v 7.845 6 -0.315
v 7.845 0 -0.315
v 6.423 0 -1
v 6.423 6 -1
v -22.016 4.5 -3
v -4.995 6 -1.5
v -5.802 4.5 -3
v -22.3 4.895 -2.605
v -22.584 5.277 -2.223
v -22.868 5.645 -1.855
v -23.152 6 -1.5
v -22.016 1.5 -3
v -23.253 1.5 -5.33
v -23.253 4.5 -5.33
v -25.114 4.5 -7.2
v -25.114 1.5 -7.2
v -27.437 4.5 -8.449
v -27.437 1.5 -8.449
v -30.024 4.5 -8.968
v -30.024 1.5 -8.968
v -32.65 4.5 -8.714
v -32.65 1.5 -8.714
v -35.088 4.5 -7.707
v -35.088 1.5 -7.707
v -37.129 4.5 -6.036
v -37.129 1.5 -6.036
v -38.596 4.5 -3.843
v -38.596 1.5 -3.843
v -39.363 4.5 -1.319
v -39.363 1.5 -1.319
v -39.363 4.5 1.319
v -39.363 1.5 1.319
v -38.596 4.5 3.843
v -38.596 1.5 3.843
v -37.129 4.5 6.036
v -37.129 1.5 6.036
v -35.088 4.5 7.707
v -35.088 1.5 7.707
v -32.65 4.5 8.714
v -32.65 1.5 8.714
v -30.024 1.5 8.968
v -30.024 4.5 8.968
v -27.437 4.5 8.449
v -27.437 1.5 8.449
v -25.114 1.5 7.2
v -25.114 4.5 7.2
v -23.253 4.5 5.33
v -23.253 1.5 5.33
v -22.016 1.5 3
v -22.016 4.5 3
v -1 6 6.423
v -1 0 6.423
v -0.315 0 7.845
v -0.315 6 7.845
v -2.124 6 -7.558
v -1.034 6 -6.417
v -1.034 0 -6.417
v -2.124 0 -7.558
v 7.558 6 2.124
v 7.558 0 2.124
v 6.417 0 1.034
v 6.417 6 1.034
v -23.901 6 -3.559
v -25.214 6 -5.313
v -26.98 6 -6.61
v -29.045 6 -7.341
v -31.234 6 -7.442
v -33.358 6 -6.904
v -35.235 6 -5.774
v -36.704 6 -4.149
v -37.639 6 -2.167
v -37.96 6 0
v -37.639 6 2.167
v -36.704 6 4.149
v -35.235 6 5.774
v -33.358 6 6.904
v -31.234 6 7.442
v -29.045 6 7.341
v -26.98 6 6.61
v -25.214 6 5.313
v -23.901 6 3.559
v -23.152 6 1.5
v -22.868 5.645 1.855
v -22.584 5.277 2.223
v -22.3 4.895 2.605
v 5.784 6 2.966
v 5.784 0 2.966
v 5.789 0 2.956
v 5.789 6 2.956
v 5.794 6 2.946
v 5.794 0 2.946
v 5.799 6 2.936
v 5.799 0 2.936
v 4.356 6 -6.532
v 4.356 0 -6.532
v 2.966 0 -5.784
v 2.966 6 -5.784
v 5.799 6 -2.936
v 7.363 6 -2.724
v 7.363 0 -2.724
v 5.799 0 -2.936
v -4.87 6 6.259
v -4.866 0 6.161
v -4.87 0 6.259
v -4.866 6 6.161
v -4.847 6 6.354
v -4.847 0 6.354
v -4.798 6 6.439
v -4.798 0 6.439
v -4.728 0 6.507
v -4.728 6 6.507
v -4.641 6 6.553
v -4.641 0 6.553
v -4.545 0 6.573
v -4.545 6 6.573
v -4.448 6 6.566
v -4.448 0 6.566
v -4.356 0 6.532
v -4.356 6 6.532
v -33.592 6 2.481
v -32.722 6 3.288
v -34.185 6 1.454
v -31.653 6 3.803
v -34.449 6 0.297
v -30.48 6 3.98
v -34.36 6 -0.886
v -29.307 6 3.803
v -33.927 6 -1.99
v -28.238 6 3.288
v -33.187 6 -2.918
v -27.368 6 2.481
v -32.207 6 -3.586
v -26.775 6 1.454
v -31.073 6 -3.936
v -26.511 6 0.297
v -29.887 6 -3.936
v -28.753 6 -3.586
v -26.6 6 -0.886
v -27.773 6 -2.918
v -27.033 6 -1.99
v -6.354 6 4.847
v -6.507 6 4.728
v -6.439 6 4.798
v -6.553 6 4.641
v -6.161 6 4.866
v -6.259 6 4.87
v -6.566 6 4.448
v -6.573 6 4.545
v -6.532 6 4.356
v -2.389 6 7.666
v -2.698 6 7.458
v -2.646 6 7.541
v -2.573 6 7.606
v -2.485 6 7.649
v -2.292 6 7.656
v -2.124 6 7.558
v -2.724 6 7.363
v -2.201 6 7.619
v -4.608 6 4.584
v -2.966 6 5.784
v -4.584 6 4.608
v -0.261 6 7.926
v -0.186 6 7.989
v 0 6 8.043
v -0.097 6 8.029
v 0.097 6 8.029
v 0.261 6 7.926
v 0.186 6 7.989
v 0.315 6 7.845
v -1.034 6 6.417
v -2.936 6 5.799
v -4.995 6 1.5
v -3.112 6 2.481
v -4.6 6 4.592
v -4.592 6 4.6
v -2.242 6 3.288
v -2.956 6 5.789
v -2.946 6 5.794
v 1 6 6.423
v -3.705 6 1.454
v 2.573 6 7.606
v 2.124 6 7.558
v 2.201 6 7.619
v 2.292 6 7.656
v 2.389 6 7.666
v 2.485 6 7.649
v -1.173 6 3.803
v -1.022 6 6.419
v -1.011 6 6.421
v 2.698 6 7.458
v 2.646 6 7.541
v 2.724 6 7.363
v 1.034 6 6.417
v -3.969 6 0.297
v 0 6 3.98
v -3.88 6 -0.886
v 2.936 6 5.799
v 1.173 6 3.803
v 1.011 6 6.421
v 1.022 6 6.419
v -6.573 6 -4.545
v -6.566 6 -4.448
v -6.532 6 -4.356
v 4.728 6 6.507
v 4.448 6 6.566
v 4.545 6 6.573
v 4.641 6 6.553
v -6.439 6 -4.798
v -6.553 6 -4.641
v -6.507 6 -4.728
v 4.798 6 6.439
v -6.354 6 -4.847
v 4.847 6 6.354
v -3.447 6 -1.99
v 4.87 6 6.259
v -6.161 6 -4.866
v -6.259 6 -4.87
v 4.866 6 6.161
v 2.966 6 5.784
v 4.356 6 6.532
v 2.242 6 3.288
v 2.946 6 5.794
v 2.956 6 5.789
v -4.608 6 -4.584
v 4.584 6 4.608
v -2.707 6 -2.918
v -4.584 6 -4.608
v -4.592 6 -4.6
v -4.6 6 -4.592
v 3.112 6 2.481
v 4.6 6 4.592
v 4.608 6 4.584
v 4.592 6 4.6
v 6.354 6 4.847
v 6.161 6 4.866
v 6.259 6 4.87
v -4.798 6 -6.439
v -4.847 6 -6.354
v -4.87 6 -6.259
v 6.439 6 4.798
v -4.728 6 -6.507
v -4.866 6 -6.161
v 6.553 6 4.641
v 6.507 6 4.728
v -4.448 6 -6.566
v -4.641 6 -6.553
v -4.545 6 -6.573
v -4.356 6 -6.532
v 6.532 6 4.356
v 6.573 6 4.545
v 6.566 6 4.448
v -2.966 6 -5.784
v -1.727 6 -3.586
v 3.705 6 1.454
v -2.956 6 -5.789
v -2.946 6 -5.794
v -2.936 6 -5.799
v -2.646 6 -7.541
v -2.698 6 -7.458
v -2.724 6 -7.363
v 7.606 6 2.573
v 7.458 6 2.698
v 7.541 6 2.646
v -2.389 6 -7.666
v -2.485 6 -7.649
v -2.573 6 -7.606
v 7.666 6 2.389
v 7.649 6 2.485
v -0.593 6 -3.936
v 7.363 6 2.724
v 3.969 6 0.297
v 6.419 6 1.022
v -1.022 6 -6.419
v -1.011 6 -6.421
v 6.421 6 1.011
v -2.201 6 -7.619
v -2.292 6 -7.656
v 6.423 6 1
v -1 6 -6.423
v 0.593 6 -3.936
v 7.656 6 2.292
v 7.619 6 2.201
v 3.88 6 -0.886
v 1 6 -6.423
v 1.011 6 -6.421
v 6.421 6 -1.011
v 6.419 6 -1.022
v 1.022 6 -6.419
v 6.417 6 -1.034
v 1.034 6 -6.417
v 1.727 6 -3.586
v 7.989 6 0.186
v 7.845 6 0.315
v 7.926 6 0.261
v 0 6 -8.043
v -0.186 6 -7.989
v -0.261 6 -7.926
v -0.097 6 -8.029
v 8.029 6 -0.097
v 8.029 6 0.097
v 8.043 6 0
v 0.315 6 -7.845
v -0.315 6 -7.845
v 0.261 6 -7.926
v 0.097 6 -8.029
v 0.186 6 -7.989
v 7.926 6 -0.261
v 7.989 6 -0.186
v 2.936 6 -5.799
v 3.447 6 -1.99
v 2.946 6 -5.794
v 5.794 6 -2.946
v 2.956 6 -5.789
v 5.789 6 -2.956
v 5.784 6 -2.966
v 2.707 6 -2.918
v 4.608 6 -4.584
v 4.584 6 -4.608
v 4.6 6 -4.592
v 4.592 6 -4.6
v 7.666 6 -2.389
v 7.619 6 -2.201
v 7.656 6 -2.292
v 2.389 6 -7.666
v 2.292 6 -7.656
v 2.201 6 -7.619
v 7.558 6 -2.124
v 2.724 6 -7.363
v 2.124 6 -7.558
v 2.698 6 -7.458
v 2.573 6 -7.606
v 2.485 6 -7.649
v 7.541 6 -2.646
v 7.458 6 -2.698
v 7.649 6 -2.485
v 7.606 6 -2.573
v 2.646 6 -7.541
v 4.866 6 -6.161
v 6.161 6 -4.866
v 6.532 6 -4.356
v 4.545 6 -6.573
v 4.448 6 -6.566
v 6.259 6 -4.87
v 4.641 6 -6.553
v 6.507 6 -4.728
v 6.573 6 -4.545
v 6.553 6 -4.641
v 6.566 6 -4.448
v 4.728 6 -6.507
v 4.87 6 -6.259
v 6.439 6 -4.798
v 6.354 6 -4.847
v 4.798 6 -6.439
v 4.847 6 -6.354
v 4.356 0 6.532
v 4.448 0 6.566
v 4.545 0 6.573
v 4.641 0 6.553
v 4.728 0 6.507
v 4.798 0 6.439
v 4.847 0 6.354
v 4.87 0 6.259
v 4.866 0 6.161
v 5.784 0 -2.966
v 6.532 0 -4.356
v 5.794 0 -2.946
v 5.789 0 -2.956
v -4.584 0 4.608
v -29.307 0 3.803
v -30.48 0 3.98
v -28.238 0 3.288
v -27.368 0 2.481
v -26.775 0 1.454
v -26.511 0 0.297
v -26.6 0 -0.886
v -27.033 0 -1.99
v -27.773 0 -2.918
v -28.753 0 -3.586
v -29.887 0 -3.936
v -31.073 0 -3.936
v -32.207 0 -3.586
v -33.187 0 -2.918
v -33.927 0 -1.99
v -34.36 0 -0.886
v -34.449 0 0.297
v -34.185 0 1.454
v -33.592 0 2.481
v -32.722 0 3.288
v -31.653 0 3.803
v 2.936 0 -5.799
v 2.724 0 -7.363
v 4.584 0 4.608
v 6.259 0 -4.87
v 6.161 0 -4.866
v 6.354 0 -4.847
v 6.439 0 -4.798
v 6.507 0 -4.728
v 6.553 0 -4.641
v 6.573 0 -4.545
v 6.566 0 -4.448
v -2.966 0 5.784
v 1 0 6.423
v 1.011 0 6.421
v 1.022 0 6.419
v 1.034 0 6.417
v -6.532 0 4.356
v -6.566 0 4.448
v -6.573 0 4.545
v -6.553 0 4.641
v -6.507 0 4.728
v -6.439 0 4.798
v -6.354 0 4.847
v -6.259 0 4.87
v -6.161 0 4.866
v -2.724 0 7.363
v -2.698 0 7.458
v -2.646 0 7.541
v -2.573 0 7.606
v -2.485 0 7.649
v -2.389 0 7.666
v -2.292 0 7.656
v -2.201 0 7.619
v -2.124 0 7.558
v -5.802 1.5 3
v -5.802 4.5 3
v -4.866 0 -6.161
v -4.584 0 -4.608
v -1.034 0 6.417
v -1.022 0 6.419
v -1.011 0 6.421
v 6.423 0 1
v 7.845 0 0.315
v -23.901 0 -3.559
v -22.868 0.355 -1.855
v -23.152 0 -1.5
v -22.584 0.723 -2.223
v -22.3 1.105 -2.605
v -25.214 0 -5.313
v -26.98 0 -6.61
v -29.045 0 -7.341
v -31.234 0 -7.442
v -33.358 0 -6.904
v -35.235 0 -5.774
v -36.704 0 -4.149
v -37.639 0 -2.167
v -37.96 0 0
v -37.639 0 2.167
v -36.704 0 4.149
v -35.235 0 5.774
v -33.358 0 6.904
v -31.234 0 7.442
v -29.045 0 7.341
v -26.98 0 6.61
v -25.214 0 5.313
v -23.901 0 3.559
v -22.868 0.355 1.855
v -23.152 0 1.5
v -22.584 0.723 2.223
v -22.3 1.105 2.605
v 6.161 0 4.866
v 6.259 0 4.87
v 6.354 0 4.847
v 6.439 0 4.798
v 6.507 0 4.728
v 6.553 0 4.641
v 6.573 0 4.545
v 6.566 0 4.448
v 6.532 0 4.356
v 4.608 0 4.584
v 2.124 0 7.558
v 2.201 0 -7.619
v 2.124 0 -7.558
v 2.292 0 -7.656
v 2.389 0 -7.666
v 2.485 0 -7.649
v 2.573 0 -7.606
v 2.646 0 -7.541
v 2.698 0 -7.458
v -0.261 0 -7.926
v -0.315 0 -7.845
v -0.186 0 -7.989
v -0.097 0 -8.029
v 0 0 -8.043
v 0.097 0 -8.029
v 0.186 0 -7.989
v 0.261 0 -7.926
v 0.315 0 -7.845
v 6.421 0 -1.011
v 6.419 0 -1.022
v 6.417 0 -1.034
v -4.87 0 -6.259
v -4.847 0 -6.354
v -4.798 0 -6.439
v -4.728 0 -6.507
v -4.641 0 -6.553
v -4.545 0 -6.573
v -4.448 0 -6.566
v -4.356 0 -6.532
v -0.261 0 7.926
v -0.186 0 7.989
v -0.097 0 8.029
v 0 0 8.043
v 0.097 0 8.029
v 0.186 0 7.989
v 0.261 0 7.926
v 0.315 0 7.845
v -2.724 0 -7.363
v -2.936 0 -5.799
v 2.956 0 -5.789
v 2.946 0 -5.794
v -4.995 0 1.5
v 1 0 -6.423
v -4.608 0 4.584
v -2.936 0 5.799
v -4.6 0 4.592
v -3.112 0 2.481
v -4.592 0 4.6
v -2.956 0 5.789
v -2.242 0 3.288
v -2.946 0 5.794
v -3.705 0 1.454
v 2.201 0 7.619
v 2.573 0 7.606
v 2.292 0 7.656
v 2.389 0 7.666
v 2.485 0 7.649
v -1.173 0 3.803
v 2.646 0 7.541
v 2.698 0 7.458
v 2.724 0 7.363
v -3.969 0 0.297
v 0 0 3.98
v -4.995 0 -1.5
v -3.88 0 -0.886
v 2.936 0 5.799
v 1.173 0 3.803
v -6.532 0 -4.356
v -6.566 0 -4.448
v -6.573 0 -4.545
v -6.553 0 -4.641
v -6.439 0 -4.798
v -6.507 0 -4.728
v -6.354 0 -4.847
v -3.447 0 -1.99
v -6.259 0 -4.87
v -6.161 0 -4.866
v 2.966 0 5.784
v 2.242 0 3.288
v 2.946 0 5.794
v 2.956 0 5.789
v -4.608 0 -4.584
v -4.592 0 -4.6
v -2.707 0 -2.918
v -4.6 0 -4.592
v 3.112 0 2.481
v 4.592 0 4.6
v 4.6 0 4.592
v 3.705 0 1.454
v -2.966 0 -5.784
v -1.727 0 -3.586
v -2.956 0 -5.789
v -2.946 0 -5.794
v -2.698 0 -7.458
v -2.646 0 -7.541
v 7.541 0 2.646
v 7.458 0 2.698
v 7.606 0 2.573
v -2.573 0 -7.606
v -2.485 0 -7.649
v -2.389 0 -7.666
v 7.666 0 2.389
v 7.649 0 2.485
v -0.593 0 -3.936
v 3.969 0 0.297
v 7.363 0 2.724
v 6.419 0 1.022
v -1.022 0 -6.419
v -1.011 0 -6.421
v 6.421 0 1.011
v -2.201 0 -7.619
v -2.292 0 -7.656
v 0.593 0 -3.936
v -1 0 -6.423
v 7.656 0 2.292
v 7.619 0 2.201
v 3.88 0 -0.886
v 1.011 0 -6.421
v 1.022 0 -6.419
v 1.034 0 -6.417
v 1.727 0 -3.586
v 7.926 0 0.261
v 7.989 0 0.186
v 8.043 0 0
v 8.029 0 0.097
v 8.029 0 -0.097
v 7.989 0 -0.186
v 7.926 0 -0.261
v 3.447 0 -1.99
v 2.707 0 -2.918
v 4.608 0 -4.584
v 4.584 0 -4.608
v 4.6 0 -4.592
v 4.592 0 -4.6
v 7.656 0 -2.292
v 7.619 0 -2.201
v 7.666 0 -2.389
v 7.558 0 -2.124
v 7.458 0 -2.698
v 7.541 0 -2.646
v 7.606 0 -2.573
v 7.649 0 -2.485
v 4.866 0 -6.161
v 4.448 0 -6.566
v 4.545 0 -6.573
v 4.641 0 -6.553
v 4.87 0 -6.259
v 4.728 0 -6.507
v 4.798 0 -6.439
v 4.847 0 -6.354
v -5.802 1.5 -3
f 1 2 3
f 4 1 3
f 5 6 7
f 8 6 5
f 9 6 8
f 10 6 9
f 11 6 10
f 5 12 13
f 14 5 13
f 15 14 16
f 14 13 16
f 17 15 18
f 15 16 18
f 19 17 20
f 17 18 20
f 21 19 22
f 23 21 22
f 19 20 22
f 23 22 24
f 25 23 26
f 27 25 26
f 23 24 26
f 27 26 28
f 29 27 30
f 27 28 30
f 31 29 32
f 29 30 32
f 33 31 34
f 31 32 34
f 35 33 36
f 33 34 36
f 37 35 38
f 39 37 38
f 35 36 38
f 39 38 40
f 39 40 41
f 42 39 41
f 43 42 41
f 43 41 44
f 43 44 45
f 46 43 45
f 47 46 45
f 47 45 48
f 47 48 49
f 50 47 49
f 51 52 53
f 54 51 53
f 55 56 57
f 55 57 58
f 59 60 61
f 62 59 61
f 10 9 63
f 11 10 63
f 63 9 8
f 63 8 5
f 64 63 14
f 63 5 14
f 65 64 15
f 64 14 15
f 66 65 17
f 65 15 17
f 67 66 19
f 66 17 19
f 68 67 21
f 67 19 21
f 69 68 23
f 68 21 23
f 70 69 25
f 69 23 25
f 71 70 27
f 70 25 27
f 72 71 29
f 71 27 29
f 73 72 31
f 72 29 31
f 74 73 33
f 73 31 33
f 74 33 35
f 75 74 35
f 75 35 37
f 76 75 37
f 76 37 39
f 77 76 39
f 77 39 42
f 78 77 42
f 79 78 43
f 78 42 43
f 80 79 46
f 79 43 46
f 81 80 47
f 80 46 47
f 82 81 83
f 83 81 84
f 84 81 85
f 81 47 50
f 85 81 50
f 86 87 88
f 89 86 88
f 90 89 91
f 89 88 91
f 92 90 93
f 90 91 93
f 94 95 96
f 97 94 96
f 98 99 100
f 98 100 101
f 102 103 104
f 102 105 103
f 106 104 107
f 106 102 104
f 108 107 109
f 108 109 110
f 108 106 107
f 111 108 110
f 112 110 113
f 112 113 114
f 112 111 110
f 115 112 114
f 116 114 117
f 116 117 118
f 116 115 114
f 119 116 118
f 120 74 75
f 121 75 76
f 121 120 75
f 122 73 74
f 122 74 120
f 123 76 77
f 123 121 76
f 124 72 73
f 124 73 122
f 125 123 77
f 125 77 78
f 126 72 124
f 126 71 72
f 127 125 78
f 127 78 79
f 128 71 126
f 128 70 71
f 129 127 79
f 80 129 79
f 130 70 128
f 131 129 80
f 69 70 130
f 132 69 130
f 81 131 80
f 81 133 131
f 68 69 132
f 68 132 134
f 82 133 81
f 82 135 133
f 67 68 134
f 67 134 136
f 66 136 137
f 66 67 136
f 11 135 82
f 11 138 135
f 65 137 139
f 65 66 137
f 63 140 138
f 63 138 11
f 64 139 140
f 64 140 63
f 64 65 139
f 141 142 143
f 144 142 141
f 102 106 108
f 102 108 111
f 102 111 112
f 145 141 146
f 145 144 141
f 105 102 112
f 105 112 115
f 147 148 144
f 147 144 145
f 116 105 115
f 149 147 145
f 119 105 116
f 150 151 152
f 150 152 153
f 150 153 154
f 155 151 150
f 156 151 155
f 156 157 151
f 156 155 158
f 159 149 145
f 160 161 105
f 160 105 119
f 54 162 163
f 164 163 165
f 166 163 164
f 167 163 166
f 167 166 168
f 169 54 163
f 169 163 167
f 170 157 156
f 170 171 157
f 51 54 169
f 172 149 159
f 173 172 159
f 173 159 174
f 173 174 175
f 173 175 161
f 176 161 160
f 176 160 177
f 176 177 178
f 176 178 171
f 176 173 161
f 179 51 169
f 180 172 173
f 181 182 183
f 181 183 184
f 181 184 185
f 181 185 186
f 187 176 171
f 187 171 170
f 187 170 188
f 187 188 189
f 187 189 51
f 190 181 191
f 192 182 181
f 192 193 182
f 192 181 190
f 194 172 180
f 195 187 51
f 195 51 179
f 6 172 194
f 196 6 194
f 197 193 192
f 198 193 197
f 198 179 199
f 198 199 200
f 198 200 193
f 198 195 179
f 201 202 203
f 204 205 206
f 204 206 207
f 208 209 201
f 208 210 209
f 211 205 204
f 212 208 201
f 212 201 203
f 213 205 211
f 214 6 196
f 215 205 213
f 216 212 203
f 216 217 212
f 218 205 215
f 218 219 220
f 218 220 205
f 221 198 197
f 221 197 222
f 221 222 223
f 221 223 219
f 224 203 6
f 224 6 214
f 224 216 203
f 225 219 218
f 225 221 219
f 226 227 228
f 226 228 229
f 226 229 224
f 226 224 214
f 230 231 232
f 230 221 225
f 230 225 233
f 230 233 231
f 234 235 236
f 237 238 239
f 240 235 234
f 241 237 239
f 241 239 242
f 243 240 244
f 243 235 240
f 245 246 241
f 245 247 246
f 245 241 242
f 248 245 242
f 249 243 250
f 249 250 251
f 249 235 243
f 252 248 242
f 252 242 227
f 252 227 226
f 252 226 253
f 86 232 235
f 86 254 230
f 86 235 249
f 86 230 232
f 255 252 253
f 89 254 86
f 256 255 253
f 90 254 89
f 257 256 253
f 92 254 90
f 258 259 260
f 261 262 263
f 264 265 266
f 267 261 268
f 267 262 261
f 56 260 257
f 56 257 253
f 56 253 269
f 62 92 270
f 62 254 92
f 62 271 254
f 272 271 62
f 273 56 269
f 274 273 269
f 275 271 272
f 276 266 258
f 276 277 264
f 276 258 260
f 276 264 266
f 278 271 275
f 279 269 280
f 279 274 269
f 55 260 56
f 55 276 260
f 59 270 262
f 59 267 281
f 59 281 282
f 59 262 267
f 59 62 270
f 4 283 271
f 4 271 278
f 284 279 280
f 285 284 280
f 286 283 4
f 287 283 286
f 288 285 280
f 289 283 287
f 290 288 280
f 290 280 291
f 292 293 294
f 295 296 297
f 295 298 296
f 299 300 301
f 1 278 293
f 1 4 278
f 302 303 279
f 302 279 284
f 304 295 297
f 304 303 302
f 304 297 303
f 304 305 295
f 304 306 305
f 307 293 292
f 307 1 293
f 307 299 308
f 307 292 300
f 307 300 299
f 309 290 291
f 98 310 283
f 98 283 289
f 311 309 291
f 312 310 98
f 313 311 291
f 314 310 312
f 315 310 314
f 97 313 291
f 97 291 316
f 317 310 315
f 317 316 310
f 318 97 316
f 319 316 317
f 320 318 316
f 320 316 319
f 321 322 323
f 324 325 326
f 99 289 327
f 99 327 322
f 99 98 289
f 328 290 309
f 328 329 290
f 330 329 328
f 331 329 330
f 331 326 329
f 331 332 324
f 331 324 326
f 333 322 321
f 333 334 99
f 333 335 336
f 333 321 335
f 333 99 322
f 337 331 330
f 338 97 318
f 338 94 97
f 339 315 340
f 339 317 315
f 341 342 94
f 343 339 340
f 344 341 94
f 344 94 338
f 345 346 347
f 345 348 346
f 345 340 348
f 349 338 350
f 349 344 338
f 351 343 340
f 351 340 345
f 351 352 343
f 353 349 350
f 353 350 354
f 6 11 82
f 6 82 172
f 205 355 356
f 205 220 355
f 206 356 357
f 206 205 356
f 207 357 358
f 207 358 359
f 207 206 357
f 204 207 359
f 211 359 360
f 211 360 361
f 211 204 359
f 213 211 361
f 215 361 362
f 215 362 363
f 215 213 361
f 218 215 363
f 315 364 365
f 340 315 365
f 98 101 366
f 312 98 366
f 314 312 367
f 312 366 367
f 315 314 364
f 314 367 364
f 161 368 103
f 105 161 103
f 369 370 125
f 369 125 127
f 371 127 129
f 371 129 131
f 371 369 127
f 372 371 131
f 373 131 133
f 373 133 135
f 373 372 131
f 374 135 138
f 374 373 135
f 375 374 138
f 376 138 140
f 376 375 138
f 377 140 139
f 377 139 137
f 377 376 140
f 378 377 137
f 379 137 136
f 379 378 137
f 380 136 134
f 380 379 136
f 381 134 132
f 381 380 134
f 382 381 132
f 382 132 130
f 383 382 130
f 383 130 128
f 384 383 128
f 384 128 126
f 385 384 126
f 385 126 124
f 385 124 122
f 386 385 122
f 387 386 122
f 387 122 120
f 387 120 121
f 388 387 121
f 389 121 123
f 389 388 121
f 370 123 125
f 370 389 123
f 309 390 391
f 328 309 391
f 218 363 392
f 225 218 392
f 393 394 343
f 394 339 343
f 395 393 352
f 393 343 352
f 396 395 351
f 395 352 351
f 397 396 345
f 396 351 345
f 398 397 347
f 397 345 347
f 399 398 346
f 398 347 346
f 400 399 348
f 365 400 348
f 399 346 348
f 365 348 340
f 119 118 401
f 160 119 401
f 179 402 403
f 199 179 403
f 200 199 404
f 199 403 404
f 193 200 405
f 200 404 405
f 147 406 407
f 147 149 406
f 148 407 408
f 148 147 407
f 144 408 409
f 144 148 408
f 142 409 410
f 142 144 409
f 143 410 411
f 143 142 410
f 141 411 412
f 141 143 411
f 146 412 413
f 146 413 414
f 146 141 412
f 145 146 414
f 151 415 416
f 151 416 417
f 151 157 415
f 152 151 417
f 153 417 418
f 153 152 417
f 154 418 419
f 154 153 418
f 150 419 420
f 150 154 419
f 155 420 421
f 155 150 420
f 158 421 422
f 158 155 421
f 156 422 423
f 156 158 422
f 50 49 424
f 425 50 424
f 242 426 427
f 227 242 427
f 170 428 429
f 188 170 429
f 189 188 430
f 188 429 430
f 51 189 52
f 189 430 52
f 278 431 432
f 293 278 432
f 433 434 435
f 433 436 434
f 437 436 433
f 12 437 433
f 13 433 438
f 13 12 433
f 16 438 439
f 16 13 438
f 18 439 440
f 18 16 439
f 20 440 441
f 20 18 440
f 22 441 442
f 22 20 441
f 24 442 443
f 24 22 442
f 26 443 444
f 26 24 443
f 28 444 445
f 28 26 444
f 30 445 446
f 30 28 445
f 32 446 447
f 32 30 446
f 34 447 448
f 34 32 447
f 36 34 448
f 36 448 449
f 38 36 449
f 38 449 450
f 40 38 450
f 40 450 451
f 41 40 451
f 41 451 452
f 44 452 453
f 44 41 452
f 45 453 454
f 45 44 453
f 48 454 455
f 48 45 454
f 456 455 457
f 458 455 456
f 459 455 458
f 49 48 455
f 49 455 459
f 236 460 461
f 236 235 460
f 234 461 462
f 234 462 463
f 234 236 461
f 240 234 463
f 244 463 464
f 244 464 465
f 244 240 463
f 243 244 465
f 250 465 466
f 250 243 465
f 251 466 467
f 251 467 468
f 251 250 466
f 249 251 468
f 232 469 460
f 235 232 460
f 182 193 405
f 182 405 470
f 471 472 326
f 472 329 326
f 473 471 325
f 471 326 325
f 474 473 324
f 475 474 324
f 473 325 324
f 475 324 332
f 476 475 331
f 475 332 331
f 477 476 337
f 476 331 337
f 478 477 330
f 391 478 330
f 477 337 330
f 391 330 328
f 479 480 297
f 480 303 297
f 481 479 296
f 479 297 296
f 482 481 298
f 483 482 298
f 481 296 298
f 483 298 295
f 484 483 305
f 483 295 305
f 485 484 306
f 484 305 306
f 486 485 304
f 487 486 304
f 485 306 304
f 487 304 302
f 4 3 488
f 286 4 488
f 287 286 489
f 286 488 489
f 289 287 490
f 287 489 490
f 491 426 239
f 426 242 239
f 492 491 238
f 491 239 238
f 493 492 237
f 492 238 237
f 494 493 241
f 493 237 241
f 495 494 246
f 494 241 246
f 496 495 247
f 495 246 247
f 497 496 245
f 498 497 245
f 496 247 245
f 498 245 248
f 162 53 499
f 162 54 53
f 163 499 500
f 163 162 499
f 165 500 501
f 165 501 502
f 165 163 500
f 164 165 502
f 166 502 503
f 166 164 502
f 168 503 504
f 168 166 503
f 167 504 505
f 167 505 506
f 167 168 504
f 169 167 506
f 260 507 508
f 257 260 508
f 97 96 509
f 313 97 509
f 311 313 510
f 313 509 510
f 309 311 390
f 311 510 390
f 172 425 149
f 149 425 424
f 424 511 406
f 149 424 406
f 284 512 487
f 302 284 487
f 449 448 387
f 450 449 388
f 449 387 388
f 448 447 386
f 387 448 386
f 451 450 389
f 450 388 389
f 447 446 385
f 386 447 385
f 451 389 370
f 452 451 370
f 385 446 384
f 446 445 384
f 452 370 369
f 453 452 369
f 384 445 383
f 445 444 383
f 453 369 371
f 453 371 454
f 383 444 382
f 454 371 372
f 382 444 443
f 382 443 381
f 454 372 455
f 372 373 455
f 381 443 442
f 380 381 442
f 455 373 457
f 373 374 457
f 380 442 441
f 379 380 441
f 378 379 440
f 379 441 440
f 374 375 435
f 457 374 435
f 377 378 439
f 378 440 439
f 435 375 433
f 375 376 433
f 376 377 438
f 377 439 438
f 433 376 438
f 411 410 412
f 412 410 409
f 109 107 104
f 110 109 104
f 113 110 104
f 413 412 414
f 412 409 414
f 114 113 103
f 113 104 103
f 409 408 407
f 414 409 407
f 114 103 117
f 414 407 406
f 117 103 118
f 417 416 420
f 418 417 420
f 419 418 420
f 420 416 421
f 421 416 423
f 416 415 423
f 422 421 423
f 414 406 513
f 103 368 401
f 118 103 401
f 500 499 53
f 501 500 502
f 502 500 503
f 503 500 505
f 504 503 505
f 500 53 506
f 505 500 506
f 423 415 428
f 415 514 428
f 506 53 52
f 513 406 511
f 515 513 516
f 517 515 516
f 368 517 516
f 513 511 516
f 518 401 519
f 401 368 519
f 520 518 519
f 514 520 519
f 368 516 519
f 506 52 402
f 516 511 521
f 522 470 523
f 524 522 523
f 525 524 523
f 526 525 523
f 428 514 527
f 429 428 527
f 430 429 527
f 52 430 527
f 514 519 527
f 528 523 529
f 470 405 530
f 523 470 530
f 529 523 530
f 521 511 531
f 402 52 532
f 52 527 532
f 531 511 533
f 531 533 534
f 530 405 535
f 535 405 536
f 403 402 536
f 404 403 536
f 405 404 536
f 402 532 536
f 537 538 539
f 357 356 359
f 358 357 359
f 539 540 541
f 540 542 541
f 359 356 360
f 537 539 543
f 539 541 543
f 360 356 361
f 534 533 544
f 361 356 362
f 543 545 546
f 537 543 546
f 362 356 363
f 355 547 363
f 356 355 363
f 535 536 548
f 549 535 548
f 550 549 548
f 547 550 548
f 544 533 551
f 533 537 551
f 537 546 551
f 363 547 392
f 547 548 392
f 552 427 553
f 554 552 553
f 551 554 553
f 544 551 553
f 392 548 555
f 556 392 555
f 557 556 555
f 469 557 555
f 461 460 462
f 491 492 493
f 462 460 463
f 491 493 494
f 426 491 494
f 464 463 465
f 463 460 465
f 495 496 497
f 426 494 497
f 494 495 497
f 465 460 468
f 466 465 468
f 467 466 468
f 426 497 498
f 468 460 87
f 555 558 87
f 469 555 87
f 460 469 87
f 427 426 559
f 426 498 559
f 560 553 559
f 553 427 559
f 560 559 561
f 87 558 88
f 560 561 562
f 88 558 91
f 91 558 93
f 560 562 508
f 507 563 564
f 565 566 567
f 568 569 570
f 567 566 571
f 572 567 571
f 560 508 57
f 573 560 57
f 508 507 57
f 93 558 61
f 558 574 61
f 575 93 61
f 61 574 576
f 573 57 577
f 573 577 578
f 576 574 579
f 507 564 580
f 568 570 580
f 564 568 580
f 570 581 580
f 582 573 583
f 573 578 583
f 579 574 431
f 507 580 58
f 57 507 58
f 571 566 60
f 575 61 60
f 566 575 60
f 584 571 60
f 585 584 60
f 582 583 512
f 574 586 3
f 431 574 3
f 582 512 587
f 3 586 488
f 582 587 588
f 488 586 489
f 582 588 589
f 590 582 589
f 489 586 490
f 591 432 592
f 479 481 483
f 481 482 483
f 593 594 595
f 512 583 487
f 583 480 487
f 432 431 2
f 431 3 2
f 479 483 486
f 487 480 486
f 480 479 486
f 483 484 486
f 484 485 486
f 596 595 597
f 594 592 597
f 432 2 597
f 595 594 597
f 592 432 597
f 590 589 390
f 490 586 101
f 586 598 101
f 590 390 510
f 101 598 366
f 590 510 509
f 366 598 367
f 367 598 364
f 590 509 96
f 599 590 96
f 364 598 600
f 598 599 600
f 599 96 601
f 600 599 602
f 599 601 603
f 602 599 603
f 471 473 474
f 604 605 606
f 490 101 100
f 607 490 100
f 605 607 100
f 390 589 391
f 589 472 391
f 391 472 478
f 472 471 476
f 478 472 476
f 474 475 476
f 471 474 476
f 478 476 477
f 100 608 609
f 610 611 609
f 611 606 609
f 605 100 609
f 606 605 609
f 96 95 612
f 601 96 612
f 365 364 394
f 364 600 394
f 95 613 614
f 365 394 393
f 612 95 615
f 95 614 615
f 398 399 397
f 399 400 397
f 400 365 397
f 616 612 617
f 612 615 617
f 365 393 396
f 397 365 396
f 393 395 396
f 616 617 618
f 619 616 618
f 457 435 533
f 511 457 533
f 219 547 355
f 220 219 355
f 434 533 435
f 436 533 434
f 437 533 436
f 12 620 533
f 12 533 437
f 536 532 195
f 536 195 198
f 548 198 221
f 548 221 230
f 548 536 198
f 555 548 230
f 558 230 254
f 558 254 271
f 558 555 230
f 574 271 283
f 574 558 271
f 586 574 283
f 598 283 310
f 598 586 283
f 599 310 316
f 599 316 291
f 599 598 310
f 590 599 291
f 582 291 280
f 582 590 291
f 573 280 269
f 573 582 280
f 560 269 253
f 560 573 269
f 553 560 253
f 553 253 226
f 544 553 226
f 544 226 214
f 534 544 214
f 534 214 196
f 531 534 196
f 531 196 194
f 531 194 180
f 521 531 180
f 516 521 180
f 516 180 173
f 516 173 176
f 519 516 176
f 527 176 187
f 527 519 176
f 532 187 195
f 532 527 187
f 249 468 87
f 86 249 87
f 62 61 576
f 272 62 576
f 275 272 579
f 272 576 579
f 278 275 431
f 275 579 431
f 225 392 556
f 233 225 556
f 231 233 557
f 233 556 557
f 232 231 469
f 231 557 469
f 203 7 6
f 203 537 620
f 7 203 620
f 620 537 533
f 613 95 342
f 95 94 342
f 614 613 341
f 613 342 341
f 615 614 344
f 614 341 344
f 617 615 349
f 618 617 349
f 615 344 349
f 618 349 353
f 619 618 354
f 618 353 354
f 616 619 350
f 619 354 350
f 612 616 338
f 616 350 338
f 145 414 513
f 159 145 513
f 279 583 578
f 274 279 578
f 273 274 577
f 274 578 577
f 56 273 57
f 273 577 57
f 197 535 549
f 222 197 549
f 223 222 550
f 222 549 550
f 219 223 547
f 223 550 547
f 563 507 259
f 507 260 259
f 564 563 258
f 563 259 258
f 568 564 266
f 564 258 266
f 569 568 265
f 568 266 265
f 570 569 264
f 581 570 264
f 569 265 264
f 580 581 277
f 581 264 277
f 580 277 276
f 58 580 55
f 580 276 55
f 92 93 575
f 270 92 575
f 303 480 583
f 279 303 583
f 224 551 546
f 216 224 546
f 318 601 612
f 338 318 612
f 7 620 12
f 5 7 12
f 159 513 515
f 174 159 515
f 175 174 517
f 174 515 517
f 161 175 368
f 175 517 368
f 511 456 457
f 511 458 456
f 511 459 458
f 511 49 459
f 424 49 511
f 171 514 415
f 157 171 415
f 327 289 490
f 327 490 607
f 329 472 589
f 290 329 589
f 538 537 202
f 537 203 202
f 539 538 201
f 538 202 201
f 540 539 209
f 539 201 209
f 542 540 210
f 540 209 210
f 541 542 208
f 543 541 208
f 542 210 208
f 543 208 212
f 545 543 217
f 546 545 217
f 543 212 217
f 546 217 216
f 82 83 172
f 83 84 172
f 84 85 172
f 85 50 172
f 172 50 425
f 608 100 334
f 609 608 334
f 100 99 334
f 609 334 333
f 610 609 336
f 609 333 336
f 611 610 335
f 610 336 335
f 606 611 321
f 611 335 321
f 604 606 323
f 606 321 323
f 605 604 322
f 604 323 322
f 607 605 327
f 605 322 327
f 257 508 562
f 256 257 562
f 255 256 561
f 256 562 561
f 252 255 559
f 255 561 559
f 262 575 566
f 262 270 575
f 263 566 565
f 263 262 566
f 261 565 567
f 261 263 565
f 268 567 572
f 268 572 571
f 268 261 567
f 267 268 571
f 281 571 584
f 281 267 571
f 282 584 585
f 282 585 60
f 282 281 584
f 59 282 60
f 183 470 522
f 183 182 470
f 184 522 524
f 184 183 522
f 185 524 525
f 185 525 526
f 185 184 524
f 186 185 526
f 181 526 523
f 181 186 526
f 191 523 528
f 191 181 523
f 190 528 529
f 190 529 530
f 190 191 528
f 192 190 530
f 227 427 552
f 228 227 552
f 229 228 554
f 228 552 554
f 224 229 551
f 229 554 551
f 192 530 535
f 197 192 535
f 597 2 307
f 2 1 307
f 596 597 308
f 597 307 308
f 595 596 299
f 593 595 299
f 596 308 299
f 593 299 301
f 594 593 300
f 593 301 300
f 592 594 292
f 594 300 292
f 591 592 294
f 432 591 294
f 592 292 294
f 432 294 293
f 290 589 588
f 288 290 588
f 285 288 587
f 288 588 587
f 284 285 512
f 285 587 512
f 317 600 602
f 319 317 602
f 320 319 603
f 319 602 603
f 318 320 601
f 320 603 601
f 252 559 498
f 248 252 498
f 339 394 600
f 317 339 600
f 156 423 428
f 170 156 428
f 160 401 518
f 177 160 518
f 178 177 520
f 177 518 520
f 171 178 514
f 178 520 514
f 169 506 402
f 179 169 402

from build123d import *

# Parameters (mm, degrees)
SKETCH1_R           = 3.98
BOSS_EXTRUDE1_DEPTH = 6
FILLET1_R           = 0.35
CHAMFER1_SIZE       = 1.5


with BuildPart() as part:
    # Sketch1 → Boss-Extrude1 (new body)
    with BuildSketch(Plane(origin=(0, 0, 0), x_dir=(1, 0, 0), z_dir=(0, 1, 0))):
        with BuildLine():
            Line((-14.732151132, 3), (-22.015934783, 3))
            ThreePointArc((-22.015934783, 3), (-39.46, 0), (-22.015934783, -3))
            Line((-22.015934783, -3), (-5.802039289, -3))
            Line((-5.802039289, -3), (-6.876644452, -4.996174644))
            Line((-6.876644452, -4.996174644), (-4.608220474, -4.58413613))
            ThreePointArc((-4.608220474, -4.58413613), (-4.596194078, -4.596194078), (-4.58413613, -4.608220474))
            Line((-4.58413613, -4.608220474), (-4.996174644, -6.876644452))
            Line((-4.996174644, -6.876644452), (-2.966102142, -5.783790979))
            ThreePointArc((-2.966102142, -5.783790979), (-2.950938248, -5.791542407), (-2.935754098, -5.799254079))
            Line((-2.935754098, -5.799254079), (-2.626644452, -8.083980389))
            Line((-2.626644452, -8.083980389), (-1.033641065, -6.417288068))
            ThreePointArc((-1.033641065, -6.417288068), (-1.016824023, -6.419974214), (-1, -6.422616289))
            Line((-1, -6.422616289), (0, -8.5))
            Line((0, -8.5), (1, -6.422616289))
            ThreePointArc((1, -6.422616289), (1.016824023, -6.419974214), (1.033641065, -6.417288068))
            Line((1.033641065, -6.417288068), (2.626644452, -8.083980389))
            Line((2.626644452, -8.083980389), (2.935754098, -5.799254079))
            ThreePointArc((2.935754098, -5.799254079), (2.950938248, -5.791542407), (2.966102142, -5.783790979))
            Line((2.966102142, -5.783790979), (4.996174644, -6.876644452))
            Line((4.996174644, -6.876644452), (4.58413613, -4.608220474))
            ThreePointArc((4.58413613, -4.608220474), (4.596194078, -4.596194078), (4.608220474, -4.58413613))
            Line((4.608220474, -4.58413613), (6.876644452, -4.996174644))
            Line((6.876644452, -4.996174644), (5.783790979, -2.966102142))
            ThreePointArc((5.783790979, -2.966102142), (5.791542407, -2.950938248), (5.799254079, -2.935754098))
            Line((5.799254079, -2.935754098), (8.083980389, -2.626644452))
            Line((8.083980389, -2.626644452), (6.417288068, -1.033641065))
            ThreePointArc((6.417288068, -1.033641065), (6.419974214, -1.016824023), (6.422616289, -1))
            Line((6.422616289, -1), (8.5, 0))
            Line((8.5, 0), (6.422616289, 1))
            ThreePointArc((6.422616289, 1), (6.419974214, 1.016824023), (6.417288068, 1.033641065))
            Line((6.417288068, 1.033641065), (8.083980389, 2.626644452))
            Line((8.083980389, 2.626644452), (5.799254079, 2.935754098))
            ThreePointArc((5.799254079, 2.935754098), (5.791542407, 2.950938248), (5.783790979, 2.966102142))
            Line((5.783790979, 2.966102142), (6.876644452, 4.996174644))
            Line((6.876644452, 4.996174644), (4.608220474, 4.58413613))
            ThreePointArc((4.608220474, 4.58413613), (4.596194078, 4.596194078), (4.58413613, 4.608220474))
            Line((4.58413613, 4.608220474), (4.996174644, 6.876644452))
            Line((4.996174644, 6.876644452), (2.966102142, 5.783790979))
            ThreePointArc((2.966102142, 5.783790979), (2.950938248, 5.791542407), (2.935754098, 5.799254079))
            Line((2.935754098, 5.799254079), (2.626644452, 8.083980389))
            Line((2.626644452, 8.083980389), (1.033641065, 6.417288068))
            ThreePointArc((1.033641065, 6.417288068), (1.016824023, 6.419974214), (1, 6.422616289))
            Line((1, 6.422616289), (0, 8.5))
            Line((0, 8.5), (-1, 6.422616289))
            ThreePointArc((-1, 6.422616289), (-1.016824023, 6.419974214), (-1.033641065, 6.417288068))
            Line((-1.033641065, 6.417288068), (-2.626644452, 8.083980389))
            Line((-2.626644452, 8.083980389), (-2.935754098, 5.799254079))
            ThreePointArc((-2.935754098, 5.799254079), (-2.950938248, 5.791542407), (-2.966102142, 5.783790979))
            Line((-2.966102142, 5.783790979), (-4.996174644, 6.876644452))
            Line((-4.996174644, 6.876644452), (-4.58413613, 4.608220474))
            ThreePointArc((-4.58413613, 4.608220474), (-4.596194078, 4.596194078), (-4.608220474, 4.58413613))
            Line((-4.608220474, 4.58413613), (-6.876644452, 4.996174644))
            Line((-6.876644452, 4.996174644), (-5.802039289, 3))
            Line((-5.802039289, 3), (-14.732151132, 3))
        make_face()
        with Locations(Location((-30.48, 0, 0), (0, 0, 270))):
            Circle(SKETCH1_R, mode=Mode.SUBTRACT)
        with Locations(Location((0, 0, 0), (0, 0, 270))):
            Circle(SKETCH1_R, mode=Mode.SUBTRACT)
    extrude(amount=BOSS_EXTRUDE1_DEPTH)

    # Fillet1
    fillet1_edges = [part.edges().sort_by_distance(p)[0] for p in [
        (0, 3, 8.5),
        (-2.626644452, 3, 8.083980389),
        (-4.996174644, 3, 6.876644452),
        (-6.876644452, 3, 4.996174644),
        (-6.876644452, 3, -4.996174644),
        (-4.996174644, 3, -6.876644452),
        (-2.626644452, 3, -8.083980389),
        (0, 3, -8.5),
        (2.626644452, 3, -8.083980389),
        (4.996174644, 3, -6.876644452),
        (6.876644452, 3, -4.996174644),
        (8.083980389, 3, -2.626644452),
        (8.5, 3, 0),
        (8.083980389, 3, 2.626644452),
        (6.876644452, 3, 4.996174644),
        (4.996174644, 3, 6.876644452),
        (2.626644452, 3, 8.083980389),
    ]]
    fillet(fillet1_edges, radius=FILLET1_R)

    # Chamfer1
    chamfer1_edges = [part.edges().sort_by_distance(p)[0] for p in [
        (-13.908987036, 6, -3),
        (-39.46, 6, 0),
        (-13.908987036, 6, 3),
        (-13.908987036, 0, 3),
        (-39.46, 0, 0),
        (-13.908987036, 0, -3),
    ]]
    chamfer(chamfer1_edges, length=CHAMFER1_SIZE)


solid = part.part
